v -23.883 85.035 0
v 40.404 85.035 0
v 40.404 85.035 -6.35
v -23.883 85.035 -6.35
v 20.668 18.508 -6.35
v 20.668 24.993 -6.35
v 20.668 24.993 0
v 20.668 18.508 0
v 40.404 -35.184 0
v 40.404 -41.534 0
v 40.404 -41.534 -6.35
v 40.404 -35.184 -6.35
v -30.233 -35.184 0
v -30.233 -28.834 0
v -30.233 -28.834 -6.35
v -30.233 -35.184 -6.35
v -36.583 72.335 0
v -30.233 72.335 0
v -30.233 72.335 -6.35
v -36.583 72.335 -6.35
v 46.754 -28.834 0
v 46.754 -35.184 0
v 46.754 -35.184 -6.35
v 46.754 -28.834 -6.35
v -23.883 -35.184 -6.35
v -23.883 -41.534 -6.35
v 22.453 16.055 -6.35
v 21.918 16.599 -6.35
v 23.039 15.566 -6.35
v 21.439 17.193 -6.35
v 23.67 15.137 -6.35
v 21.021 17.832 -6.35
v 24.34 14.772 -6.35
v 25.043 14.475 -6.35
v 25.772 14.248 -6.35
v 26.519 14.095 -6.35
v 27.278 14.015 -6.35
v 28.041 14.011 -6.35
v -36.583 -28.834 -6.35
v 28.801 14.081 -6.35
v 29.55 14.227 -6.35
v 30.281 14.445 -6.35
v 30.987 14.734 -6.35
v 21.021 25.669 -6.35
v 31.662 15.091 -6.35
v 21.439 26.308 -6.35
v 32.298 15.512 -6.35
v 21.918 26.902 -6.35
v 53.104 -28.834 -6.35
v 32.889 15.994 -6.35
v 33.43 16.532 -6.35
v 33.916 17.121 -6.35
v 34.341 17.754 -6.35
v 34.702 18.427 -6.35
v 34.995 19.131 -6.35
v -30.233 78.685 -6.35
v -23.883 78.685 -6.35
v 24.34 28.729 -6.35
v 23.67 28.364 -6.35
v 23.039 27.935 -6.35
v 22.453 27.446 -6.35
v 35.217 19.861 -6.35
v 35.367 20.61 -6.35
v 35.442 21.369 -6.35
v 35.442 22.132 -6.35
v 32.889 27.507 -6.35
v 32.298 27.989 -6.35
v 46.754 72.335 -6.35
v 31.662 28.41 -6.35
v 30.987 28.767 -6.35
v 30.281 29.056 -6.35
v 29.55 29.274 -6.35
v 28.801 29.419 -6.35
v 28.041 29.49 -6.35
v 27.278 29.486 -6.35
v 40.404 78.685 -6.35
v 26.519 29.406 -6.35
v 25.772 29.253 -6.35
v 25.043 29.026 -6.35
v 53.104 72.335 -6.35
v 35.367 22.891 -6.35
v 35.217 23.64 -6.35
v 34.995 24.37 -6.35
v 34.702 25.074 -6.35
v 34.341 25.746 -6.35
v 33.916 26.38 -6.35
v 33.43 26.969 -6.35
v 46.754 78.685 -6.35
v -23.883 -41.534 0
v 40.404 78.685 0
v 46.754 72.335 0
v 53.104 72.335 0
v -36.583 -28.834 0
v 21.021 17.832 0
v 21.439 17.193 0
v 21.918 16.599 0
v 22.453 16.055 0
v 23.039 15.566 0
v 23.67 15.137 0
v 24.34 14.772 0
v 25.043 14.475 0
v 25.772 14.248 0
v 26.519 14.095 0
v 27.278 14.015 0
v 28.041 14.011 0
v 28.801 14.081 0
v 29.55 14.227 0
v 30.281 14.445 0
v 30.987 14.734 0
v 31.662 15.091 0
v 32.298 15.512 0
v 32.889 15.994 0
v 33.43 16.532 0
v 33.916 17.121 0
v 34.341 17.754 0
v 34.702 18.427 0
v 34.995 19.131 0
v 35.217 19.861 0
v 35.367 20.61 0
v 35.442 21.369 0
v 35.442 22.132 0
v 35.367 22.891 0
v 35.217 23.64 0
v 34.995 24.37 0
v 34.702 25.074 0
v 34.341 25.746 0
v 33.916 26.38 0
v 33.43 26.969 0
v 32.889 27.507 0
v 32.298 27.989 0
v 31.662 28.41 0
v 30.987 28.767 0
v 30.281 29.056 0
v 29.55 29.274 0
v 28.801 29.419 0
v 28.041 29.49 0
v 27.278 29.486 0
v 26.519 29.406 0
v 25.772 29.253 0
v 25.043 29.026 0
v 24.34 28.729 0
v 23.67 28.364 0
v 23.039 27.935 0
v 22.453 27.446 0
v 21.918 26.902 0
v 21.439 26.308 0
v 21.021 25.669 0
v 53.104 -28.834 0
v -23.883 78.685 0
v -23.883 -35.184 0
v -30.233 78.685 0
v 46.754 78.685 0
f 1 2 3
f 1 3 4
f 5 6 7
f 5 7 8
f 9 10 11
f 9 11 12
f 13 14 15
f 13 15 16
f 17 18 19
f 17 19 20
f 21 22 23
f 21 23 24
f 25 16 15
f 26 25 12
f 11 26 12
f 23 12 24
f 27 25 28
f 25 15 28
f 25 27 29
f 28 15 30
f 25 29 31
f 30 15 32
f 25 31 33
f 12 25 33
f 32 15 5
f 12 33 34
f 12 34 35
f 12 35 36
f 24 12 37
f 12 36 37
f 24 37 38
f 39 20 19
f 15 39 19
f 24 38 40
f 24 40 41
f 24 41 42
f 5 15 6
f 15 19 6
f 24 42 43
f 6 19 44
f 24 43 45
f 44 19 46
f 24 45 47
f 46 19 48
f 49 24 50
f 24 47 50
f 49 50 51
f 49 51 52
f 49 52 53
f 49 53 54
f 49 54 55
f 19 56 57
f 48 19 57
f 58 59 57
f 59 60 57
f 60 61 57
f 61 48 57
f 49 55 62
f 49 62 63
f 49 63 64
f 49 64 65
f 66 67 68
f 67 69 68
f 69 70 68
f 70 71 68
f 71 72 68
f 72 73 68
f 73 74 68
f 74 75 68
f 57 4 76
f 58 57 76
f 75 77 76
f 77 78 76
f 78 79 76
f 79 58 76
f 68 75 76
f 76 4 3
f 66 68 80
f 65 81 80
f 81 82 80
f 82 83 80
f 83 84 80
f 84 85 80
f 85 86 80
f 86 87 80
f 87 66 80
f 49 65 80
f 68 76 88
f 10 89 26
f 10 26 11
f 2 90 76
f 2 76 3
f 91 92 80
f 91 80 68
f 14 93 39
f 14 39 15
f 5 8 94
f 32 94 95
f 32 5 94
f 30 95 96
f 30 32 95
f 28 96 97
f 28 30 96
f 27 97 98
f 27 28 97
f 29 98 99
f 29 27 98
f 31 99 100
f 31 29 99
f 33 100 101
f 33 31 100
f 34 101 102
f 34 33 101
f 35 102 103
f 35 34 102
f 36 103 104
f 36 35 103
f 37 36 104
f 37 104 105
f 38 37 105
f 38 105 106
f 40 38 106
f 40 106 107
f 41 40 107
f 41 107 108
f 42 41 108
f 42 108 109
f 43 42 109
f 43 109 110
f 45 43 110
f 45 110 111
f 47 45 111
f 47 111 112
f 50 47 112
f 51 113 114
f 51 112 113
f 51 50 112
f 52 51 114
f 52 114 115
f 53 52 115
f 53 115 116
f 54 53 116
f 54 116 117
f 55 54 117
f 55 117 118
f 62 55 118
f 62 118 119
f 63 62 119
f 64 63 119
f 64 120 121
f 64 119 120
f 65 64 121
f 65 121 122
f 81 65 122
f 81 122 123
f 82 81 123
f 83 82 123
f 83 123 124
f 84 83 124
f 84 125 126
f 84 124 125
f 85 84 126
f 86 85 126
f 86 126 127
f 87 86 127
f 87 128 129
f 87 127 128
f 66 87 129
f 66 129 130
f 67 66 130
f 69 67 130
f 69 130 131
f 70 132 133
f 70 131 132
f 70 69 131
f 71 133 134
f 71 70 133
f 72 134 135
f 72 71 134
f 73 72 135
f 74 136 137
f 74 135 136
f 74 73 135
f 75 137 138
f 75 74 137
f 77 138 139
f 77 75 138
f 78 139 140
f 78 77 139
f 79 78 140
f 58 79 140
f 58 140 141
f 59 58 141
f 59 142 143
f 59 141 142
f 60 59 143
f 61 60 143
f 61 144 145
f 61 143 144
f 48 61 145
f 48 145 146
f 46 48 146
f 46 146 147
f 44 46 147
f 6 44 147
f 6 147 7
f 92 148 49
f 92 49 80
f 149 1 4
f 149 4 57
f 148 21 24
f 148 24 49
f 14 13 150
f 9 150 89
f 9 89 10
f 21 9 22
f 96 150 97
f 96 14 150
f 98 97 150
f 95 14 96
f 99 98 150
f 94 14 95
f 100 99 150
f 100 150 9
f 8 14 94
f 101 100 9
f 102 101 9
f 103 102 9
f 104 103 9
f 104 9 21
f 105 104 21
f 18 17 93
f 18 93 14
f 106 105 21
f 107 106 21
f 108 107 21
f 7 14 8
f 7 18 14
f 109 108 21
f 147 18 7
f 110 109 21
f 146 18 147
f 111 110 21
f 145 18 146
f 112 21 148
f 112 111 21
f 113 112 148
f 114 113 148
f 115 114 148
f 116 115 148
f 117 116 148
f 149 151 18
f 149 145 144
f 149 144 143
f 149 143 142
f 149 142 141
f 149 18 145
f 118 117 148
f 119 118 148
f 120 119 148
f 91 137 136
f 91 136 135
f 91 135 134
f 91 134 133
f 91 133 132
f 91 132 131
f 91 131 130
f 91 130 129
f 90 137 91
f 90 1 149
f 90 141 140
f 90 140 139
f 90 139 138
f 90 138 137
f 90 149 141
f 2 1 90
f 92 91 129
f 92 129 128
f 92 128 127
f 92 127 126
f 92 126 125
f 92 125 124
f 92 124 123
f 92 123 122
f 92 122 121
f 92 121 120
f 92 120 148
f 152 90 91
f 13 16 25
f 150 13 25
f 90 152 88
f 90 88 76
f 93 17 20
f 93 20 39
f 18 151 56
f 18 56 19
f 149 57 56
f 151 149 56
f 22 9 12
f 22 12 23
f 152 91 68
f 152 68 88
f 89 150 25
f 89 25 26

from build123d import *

# Parameters (mm, degrees)
BOSS_EXTRUDE1_DEPTH = 6.35
CUT_EXTRUDE1_DEPTH  = 101.455184316


with BuildPart() as part:
    # Sketch1 → Boss-Extrude1 (new body)
    with BuildSketch(Plane.XY):
        Polygon((-30.233286112, -35.183650292), (-23.883286112, -35.183650292), (-23.883286112, -41.533650292), (40.404113888, -41.533650292), (40.404113888, -35.183650292), (46.754113888, -35.183650292), (46.754113888, -28.833650292), (53.104113888, -28.833650292), (53.104113888, 72.334549708), (46.754113888, 72.334549708), (46.754113888, 78.684549708), (40.404113888, 78.684549708), (40.404113888, 85.034549708), (-23.883286112, 85.034549708), (-23.883286112, 78.684549708), (-30.233286112, 78.684549708), (-30.233286112, 72.334549708), (-36.583286112, 72.334549708), (-36.583286112, -28.833650292), (-30.233286112, -28.833650292), align=None)
    extrude(amount=-BOSS_EXTRUDE1_DEPTH)

    # Sketch2 → Cut-Extrude1 (cut, through all)
    with BuildSketch(Plane(origin=(0, 0, -6.35), x_dir=(-1, 0, 0), z_dir=(0, 0, -1))):
        with BuildLine():
            Line((-20.668313863, 24.992906647), (-20.668313863, 18.507992769))
            ThreePointArc((-20.668313863, 18.507992769), (-35.451113888, 21.750449708), (-20.668313863, 24.992906647))
        make_face()
    extrude(amount=-CUT_EXTRUDE1_DEPTH, mode=Mode.SUBTRACT)


solid = part.part
